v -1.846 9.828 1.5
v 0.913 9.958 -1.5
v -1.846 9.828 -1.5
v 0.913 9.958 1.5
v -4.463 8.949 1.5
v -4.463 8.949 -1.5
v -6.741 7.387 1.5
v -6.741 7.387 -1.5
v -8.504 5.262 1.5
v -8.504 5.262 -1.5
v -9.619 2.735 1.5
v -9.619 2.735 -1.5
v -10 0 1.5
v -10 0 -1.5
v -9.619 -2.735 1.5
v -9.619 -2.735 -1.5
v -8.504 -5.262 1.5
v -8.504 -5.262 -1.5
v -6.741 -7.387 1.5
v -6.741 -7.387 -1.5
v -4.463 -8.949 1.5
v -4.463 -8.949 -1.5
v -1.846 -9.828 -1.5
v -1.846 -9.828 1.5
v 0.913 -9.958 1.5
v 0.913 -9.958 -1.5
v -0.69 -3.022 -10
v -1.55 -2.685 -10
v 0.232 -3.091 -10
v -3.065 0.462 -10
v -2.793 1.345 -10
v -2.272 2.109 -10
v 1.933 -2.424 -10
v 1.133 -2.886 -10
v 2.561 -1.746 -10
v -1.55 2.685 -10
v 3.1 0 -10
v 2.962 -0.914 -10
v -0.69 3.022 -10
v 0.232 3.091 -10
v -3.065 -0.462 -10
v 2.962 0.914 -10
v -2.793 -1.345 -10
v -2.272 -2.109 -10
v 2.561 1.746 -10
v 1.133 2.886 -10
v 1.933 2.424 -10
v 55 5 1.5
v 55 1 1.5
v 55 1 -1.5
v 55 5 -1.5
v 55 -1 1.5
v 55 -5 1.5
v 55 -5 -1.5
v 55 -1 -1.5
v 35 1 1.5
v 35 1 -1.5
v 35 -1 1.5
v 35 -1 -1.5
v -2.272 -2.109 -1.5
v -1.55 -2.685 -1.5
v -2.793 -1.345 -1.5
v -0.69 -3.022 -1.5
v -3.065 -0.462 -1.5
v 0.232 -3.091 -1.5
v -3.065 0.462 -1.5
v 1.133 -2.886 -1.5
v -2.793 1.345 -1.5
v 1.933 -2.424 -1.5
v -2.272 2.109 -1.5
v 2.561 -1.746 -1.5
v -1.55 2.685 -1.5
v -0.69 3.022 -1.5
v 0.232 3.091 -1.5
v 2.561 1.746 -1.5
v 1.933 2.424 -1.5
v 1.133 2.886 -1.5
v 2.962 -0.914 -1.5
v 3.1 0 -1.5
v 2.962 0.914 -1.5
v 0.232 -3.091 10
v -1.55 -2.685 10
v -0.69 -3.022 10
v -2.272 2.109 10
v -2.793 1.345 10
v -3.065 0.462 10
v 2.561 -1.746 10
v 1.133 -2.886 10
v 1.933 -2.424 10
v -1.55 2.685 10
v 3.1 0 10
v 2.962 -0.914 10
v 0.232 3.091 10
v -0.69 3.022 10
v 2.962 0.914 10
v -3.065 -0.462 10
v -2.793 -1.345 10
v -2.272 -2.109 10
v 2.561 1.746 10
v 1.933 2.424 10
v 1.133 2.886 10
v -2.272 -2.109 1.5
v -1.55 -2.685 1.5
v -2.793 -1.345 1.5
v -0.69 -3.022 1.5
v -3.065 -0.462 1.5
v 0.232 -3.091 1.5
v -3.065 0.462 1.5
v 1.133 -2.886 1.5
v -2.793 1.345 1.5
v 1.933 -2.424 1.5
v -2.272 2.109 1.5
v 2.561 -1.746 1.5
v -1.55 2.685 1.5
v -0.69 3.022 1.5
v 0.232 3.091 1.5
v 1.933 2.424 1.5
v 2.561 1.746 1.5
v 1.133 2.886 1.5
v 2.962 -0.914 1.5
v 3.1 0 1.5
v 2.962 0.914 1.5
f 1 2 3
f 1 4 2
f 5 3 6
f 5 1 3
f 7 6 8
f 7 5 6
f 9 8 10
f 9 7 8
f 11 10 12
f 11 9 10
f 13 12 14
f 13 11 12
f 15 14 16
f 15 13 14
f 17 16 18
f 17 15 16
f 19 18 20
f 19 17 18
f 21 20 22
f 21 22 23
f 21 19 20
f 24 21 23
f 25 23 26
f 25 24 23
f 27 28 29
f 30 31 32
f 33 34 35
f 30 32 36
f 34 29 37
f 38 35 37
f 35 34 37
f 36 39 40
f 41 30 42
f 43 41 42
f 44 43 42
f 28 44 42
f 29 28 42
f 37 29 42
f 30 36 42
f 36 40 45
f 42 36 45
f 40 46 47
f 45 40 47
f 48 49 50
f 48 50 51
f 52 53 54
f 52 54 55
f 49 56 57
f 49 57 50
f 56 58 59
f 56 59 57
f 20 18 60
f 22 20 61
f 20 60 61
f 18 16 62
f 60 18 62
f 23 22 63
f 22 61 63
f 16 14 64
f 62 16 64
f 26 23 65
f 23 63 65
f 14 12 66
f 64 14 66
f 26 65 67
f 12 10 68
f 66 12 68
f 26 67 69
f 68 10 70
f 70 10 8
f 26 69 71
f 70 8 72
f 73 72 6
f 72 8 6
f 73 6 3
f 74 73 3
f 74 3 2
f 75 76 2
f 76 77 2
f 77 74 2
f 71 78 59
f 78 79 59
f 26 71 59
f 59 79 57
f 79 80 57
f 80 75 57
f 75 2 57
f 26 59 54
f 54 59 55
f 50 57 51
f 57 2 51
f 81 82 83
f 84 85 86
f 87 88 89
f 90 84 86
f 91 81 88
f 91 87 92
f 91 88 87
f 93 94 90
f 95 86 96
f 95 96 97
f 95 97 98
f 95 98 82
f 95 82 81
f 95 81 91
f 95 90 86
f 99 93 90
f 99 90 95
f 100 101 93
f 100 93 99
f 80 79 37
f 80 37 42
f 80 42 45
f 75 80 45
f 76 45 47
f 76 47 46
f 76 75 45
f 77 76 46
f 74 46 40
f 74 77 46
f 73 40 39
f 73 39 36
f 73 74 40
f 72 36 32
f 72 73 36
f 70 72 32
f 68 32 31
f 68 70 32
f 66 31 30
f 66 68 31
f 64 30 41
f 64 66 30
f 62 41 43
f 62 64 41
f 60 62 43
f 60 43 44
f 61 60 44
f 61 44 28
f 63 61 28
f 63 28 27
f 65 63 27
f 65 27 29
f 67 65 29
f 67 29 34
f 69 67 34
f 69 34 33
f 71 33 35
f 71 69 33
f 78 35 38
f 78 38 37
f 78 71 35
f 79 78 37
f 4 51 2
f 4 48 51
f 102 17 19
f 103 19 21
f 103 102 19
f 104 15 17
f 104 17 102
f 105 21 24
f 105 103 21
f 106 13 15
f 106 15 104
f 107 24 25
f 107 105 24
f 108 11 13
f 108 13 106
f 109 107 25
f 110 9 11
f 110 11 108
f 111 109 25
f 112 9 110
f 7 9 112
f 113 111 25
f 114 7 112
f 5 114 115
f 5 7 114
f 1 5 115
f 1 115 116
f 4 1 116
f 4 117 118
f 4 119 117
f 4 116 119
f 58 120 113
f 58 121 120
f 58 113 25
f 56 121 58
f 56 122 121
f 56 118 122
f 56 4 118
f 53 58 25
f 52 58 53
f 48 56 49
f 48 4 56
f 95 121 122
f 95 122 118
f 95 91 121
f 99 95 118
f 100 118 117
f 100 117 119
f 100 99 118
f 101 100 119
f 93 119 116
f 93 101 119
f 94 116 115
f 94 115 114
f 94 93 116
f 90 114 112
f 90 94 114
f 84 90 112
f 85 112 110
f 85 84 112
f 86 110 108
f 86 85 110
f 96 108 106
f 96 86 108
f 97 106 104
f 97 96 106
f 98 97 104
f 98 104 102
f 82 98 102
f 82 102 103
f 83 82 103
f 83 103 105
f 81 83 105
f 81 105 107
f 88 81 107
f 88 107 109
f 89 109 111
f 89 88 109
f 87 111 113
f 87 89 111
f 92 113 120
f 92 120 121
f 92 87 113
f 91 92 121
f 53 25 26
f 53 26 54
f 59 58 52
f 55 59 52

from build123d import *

# Parameters (mm, degrees)
F0_R     = 3.1
F1_DEPTH = 10
F2_DEPTH = 1.5
F3_W     = 20
F3_H     = 2
F4_DEPTH = 11.501


# Not quite as in the source:
# - a feature names something its author has since deleted; it is built from what else it names


with BuildPart() as f1:
    # F0 (on Top) → F1 (new body, symmetric)
    with BuildSketch(Plane.XY):
        Circle(F0_R)
    extrude(amount=F1_DEPTH, both=True)

    # F0 (on Top) → F2 (join, symmetric)
    with BuildSketch(Plane.XY):
        with BuildLine():
            ThreePointArc((0.9128866521, -9.9582447229), (7.3867742121, -6.7405909785), (10, 0))
            ThreePointArc((10, 0), (7.3867742121, 6.7405909785), (0.9128866521, 9.9582447229))
            ThreePointArc((0.9128866521, 9.9582447229), (-10, 0), (0.9128866521, -9.9582447229))
        make_face()
        Circle(F0_R, mode=Mode.SUBTRACT)
        with BuildLine():
            ThreePointArc((0.9128866521, 9.9582447229), (7.3867742121, 6.7405909785), (10, 0))
            ThreePointArc((10, 0), (7.3867742121, -6.7405909785), (0.9128866521, -9.9582447229))
            Line((0.9128866521, -9.9582447229), (55, -5))
            Line((55, -5), (55, 5))
            Line((55, 5), (0.9128866521, 9.9582447229))
        make_face()
    extrude(amount=F2_DEPTH, both=True)

    # F3 (on face) → F4 (cut, through all)
    with BuildSketch(Plane.XY.offset(1.5)):
        with Locations((45, 0)):
            Rectangle(F3_W, F3_H)
    extrude(amount=-F4_DEPTH, mode=Mode.SUBTRACT)


solid = f1.part
